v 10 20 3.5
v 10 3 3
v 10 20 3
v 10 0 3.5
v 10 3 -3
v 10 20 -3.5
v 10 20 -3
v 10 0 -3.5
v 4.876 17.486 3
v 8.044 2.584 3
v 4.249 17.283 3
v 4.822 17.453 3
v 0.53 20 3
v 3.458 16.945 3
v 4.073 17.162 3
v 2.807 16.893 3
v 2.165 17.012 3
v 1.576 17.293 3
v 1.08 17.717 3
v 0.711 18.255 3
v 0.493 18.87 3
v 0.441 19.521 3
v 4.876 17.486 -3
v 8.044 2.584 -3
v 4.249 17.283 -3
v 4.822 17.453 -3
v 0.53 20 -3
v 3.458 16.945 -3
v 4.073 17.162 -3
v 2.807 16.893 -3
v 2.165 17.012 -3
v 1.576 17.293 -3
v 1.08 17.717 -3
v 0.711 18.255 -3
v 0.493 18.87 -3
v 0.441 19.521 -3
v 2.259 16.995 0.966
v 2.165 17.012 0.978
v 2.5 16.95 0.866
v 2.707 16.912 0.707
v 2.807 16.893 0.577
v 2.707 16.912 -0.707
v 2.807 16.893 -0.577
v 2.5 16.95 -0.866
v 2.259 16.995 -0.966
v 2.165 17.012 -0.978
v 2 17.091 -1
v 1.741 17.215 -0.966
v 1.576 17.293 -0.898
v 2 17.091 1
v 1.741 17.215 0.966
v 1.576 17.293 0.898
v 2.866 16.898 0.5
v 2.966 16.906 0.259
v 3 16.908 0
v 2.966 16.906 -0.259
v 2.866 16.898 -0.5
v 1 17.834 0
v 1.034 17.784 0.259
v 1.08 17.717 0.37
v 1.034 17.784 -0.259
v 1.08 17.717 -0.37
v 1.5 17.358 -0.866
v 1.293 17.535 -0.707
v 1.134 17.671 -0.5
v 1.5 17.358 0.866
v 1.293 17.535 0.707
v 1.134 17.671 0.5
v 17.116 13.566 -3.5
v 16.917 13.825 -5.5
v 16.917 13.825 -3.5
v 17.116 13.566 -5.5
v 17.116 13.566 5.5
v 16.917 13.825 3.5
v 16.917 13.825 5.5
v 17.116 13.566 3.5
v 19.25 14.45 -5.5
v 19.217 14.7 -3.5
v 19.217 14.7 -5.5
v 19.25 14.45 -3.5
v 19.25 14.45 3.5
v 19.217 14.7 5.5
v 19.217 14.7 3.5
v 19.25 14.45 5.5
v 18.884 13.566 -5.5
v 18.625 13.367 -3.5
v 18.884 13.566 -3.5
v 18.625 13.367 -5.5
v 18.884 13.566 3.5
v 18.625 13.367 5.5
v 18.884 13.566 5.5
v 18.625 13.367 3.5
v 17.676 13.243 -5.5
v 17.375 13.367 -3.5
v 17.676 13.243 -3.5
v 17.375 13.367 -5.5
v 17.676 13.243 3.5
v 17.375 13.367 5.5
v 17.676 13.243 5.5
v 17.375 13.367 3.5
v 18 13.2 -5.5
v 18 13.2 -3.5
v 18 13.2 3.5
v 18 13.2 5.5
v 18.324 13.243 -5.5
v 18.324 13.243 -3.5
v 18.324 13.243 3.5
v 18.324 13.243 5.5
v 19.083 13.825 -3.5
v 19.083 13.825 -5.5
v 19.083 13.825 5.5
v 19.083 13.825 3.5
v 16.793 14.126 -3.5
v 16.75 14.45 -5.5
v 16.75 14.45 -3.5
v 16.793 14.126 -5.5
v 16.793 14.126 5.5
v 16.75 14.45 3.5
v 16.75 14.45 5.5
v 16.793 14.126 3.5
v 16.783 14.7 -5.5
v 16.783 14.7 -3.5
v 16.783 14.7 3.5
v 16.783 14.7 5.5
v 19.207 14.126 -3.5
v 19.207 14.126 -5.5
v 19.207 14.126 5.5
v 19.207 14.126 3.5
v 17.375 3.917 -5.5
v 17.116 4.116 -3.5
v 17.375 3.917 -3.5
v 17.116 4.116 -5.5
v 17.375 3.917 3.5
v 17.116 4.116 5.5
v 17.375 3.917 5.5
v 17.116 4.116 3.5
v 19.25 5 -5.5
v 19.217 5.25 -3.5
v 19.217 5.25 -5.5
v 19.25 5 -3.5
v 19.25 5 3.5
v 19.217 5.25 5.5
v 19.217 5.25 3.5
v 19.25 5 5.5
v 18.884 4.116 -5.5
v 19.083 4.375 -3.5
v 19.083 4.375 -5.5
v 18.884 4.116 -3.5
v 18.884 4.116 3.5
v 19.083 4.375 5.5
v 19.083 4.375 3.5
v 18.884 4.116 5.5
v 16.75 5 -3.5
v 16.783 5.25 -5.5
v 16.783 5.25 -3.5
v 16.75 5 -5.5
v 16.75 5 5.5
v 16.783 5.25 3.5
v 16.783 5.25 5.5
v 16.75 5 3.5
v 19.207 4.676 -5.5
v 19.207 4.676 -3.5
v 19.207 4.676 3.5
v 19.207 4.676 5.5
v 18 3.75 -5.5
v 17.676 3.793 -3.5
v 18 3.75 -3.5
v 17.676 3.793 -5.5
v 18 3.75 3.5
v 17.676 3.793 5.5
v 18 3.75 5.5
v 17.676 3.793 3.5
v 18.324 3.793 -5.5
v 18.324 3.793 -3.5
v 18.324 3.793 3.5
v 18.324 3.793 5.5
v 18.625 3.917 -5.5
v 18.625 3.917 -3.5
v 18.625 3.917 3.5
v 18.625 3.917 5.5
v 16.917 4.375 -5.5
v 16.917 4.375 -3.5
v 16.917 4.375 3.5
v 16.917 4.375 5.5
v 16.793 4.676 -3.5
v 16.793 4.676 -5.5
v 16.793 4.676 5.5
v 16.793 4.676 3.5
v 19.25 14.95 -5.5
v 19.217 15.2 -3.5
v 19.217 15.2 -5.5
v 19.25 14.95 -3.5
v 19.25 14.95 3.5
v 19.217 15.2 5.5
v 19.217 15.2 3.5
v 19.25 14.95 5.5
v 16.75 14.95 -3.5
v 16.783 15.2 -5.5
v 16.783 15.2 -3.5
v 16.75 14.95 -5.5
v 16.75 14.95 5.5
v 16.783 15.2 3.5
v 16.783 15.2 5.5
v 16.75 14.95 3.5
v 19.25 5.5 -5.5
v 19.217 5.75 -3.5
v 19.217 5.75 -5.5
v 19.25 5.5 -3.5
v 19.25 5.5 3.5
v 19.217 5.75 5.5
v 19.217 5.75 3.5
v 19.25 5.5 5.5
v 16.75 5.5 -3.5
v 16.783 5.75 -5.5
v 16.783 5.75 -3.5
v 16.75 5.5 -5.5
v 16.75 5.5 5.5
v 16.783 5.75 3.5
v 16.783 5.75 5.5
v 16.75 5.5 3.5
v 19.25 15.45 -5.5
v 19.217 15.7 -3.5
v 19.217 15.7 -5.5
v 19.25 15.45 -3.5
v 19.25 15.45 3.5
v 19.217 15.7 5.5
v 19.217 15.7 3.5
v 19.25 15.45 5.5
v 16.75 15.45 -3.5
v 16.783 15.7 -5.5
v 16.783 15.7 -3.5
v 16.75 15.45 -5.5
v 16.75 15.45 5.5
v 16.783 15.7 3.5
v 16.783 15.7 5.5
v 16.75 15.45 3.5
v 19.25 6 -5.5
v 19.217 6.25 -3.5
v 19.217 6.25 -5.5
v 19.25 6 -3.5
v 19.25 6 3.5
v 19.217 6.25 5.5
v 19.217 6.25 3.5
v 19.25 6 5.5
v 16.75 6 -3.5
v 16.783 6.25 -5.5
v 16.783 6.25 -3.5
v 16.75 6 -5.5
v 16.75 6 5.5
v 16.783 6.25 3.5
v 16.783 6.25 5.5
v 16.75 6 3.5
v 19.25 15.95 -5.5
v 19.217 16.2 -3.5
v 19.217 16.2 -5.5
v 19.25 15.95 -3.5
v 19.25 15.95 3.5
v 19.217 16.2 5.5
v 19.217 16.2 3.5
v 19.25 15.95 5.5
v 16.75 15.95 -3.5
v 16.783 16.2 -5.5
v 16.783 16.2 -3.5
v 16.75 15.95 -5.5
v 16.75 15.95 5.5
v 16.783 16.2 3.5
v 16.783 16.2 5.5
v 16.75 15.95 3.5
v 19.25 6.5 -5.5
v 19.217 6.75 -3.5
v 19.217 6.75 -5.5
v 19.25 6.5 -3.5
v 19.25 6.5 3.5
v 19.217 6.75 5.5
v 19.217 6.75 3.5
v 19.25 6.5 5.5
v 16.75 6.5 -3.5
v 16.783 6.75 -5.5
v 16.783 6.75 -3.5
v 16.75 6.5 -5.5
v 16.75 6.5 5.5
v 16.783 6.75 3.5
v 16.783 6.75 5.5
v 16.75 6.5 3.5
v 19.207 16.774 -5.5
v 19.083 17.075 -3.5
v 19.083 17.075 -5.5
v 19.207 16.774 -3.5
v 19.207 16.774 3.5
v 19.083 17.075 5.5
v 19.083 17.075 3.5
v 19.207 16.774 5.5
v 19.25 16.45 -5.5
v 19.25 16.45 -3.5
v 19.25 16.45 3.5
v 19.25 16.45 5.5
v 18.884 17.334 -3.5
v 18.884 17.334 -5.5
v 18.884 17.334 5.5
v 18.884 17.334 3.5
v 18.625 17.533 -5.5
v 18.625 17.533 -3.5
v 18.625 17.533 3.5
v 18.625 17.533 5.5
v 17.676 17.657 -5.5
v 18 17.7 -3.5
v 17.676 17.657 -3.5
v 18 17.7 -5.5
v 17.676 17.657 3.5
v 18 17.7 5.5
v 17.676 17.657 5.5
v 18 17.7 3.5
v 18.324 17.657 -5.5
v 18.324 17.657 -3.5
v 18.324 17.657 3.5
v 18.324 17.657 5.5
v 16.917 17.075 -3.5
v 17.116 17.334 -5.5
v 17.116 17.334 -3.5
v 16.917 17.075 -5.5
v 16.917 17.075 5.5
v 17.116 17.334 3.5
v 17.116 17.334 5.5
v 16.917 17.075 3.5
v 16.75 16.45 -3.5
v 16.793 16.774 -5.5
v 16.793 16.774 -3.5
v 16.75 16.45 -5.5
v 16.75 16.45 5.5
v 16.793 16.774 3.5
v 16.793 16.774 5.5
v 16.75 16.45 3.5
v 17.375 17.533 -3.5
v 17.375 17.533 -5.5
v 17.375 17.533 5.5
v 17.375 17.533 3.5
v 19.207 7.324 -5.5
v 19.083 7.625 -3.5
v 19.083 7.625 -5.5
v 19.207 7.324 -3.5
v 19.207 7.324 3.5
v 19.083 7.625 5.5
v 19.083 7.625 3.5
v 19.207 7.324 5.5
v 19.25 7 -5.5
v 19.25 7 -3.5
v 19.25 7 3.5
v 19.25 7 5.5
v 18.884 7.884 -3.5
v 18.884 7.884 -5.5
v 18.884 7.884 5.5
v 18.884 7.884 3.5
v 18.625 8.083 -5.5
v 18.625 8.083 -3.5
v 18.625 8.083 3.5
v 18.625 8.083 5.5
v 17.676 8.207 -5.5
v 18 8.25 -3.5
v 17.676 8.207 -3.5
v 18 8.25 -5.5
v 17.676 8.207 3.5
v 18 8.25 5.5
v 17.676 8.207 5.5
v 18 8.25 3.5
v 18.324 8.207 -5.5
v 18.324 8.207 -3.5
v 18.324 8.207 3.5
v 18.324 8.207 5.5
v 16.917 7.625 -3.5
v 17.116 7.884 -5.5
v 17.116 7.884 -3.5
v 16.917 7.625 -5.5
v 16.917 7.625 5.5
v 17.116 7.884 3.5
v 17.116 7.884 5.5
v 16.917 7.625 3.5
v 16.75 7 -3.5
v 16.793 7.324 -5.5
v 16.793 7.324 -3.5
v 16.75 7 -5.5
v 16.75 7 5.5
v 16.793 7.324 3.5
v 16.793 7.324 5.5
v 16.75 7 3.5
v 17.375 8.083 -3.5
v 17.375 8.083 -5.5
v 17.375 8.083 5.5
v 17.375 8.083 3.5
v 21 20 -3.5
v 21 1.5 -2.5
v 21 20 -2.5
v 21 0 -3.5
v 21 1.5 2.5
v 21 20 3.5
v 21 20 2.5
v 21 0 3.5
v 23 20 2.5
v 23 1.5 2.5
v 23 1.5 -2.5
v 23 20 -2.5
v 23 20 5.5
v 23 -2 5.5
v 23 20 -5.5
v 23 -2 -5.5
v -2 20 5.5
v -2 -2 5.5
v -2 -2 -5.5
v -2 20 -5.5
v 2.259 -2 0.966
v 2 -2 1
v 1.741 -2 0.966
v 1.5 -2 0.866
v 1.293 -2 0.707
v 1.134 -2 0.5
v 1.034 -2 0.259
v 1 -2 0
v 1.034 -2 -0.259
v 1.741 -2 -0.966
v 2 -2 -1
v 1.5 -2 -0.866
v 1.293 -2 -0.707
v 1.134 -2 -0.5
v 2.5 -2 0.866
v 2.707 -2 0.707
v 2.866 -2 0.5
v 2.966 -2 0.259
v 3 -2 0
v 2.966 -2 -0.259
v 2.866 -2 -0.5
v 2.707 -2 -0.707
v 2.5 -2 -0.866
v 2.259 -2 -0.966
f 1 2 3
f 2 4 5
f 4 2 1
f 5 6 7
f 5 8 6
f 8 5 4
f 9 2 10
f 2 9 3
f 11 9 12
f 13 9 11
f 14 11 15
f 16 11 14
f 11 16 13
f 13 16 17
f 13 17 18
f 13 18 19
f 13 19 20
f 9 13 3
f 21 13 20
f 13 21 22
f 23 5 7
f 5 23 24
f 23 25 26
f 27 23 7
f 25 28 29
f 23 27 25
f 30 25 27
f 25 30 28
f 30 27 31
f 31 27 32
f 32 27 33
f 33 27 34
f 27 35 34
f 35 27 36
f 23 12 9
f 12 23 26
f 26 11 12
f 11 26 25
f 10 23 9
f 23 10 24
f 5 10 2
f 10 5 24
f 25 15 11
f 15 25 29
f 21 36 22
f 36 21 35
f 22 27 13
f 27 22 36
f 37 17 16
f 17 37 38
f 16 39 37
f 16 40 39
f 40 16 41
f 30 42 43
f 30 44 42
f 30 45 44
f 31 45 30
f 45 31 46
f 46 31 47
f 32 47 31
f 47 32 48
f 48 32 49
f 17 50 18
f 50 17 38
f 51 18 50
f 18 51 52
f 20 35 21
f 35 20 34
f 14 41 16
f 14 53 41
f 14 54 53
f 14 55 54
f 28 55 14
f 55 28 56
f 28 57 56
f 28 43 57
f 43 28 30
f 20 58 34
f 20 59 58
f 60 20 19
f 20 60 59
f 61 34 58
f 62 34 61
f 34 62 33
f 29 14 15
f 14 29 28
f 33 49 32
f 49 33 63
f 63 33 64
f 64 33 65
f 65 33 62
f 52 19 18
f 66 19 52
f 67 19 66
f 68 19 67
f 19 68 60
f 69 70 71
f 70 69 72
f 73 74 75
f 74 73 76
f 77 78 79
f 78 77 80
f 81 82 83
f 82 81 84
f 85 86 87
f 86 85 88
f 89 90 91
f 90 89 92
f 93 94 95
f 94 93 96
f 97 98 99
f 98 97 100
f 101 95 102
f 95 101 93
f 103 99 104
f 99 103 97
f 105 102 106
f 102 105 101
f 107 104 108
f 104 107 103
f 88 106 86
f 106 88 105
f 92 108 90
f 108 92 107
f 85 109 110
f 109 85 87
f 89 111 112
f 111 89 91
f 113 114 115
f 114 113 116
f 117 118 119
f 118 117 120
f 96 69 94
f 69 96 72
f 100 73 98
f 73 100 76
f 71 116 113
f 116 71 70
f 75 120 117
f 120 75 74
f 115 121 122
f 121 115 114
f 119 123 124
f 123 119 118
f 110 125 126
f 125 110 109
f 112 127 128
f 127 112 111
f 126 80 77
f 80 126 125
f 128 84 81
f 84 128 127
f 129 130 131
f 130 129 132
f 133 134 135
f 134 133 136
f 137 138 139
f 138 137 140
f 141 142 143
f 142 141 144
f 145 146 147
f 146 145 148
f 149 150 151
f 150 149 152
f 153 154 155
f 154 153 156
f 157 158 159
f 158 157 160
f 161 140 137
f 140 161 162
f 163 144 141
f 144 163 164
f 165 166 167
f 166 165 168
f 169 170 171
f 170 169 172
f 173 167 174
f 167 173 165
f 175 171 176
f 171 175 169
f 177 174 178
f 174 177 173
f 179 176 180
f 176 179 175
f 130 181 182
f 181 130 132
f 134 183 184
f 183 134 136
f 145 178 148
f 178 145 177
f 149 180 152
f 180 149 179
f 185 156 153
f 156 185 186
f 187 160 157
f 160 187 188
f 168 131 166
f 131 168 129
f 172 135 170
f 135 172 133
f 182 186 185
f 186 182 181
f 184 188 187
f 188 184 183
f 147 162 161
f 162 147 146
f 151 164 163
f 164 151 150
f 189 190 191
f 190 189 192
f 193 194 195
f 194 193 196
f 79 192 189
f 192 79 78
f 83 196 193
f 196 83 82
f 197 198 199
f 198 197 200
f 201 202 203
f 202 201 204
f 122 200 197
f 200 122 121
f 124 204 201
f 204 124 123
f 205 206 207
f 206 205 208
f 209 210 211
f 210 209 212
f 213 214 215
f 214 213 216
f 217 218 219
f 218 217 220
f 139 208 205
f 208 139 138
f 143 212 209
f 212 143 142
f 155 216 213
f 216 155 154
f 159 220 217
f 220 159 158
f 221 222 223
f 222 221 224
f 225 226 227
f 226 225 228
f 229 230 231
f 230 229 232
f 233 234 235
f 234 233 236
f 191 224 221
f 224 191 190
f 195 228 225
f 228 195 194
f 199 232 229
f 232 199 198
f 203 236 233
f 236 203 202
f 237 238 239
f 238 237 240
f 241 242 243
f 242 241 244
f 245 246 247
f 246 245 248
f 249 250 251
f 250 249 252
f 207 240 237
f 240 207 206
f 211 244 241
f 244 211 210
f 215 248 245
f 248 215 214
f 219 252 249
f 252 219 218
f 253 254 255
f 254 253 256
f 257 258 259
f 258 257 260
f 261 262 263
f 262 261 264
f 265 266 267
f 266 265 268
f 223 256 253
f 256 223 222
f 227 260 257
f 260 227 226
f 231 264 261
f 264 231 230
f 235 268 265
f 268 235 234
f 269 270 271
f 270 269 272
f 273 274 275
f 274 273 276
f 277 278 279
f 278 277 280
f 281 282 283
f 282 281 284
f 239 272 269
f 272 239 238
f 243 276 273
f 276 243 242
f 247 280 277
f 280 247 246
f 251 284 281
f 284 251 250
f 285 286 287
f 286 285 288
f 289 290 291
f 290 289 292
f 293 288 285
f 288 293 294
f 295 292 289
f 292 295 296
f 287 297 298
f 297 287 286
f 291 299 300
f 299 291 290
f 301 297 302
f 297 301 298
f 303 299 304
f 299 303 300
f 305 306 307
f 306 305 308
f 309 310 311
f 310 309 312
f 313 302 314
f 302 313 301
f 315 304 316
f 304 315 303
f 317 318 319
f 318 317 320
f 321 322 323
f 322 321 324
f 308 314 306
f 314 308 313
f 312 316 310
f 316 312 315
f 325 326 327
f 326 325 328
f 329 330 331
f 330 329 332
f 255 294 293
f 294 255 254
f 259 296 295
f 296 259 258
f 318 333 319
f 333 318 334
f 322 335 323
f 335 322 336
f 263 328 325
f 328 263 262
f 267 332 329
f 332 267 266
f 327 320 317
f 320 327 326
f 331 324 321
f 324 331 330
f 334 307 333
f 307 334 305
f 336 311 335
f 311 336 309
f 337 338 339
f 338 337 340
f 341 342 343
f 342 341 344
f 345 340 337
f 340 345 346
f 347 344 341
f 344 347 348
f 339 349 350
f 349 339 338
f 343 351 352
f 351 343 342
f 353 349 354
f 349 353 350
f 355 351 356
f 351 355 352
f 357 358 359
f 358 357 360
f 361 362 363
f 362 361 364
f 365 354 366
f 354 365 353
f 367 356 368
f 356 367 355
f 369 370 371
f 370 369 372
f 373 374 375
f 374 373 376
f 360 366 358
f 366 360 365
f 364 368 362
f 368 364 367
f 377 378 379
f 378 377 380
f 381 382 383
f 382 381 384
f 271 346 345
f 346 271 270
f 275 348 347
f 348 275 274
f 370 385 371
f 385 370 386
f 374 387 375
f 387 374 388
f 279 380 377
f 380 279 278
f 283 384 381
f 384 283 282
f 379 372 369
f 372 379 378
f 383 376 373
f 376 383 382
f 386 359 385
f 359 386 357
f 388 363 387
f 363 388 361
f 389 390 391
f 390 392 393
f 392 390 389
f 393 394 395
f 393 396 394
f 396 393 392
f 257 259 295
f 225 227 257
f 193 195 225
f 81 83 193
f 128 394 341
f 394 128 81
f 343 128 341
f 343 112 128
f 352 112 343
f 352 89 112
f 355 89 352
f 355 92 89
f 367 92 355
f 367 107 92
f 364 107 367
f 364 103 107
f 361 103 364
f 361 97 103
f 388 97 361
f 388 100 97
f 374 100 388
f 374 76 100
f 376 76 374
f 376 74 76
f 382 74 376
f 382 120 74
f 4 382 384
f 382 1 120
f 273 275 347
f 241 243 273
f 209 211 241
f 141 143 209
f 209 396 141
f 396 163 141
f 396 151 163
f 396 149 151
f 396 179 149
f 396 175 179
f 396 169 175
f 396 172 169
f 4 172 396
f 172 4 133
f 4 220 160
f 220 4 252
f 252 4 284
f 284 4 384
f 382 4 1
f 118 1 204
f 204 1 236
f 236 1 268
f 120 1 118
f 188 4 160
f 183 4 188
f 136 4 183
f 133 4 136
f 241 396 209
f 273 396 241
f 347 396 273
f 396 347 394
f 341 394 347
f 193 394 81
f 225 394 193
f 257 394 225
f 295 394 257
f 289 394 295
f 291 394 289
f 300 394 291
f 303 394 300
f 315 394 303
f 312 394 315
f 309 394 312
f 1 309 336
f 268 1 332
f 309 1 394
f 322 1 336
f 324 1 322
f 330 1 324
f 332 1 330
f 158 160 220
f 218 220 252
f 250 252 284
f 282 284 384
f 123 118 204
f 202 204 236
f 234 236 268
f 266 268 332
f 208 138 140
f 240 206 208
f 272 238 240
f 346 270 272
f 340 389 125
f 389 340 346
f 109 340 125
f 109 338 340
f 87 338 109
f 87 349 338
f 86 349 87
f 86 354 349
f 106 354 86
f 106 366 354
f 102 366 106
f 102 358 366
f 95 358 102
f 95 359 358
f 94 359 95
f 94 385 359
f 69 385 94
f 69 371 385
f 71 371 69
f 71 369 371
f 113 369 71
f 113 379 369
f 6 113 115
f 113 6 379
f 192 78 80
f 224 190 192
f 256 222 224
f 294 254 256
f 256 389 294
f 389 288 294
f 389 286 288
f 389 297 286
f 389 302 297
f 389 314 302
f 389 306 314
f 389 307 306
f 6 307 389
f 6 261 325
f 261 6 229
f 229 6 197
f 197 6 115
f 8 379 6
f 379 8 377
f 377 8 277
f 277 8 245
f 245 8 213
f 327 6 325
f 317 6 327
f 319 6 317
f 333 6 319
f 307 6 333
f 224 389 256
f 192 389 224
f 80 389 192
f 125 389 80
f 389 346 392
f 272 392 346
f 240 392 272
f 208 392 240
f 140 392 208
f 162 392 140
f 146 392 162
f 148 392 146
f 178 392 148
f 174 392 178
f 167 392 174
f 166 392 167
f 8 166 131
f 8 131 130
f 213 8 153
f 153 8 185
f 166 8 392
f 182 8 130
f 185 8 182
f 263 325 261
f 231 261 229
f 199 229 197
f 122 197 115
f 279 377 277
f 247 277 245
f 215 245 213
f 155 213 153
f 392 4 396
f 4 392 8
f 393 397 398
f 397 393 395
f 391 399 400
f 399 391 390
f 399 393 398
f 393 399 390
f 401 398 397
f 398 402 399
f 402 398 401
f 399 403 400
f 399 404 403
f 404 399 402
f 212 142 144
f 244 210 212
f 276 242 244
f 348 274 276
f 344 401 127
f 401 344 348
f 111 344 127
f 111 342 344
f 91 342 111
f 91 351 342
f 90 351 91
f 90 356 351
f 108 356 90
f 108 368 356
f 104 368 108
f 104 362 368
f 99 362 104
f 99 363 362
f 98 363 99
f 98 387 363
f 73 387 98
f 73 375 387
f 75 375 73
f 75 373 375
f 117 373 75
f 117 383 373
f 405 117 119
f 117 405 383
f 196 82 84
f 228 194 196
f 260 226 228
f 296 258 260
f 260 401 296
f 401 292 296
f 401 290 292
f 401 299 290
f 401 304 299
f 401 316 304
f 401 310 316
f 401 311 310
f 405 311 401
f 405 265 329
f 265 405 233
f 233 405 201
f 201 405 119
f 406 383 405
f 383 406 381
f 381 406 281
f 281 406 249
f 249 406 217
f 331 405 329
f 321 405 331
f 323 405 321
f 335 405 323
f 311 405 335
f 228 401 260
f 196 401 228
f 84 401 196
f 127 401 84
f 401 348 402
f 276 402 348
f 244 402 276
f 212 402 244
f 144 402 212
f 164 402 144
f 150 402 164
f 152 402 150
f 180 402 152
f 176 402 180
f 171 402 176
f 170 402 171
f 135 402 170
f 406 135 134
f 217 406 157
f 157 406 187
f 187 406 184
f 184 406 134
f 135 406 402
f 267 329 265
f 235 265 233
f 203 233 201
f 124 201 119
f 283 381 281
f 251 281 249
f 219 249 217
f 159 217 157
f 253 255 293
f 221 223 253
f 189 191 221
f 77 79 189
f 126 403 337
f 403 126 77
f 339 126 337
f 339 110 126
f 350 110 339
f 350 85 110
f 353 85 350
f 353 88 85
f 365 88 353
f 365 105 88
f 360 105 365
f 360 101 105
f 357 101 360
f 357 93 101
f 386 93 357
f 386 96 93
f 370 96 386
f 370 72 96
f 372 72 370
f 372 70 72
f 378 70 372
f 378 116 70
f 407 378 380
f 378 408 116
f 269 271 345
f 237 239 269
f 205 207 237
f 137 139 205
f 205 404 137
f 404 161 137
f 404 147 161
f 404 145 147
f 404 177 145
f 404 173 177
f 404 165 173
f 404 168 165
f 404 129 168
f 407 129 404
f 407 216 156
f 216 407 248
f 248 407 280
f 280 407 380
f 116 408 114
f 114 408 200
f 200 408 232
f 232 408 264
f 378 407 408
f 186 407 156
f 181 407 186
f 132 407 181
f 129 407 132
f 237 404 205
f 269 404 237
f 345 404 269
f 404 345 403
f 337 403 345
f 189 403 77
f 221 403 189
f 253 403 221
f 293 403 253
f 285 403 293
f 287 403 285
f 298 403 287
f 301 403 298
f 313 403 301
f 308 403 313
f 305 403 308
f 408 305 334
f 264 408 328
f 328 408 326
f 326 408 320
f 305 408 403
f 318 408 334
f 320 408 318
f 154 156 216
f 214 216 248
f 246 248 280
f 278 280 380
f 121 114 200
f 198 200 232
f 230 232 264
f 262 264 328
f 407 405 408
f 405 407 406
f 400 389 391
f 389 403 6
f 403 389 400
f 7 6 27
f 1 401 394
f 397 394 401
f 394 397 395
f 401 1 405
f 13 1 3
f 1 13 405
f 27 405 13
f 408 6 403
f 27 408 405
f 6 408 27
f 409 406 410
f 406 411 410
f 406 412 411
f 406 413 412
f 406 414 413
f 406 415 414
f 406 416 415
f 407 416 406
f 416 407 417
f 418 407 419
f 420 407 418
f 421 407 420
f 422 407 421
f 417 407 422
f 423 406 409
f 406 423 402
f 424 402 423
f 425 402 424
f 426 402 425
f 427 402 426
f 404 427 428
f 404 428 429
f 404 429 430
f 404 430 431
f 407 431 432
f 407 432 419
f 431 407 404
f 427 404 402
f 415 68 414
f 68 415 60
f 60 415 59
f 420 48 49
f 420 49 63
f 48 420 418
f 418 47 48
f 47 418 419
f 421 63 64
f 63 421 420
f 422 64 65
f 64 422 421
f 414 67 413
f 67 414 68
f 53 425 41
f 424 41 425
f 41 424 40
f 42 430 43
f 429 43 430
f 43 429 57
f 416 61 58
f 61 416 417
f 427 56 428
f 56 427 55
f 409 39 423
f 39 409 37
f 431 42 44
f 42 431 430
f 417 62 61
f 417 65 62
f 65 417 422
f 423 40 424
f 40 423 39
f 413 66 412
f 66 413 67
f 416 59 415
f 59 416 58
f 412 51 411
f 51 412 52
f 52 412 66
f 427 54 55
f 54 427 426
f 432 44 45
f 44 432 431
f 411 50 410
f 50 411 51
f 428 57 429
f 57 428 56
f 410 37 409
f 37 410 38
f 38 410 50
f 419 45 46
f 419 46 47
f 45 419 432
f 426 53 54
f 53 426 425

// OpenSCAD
filament_or = 2.0 / 2;

wall_th = 1;
wire_or = 1;

switch_w = 21;
switch_l = 11;
switch_h = 7;
switch_hole_offset_w = 5;
switch_hole_offset_l = 3;
switch_hole_ir = 2.5 / 2;
switch_hole_c_c = 6.95 + 2 * switch_hole_ir;

// edge of switch to far side of roller, resting
switch_roller_rest_h = 10;

switch_roller_offset = 3;
switch_roller_overhang = 2.3;
switch_roller_h = 6;
switch_roller_w = 20;
switch_roller_l = 6.5;
switch_roller_th = 0.2;
switch_roller_or = 5/2;
switch_roller_clearance = 6;

switch_pin_clearance = 1.5;
switch_pin_h = 5;

module roller(rotation=0) {
    rotate([0, 0, rotation]) {
        translate([-2, 0, -switch_roller_h/2])
            cube([2, switch_roller_w,
     switch_roller_h]);
        translate([-switch_roller_clearance + switch_roller_or, switch_roller_w-switch_roller_or, -switch_roller_h/2])
            cylinder(r=switch_roller_or, h=switch_roller_h);
    }
}
switch_max_angle = 12;
module switch() {
    translate([switch_roller_rest_h, 0, -switch_h/2])
        cube([switch_l, switch_w, switch_h]);      
    
    translate([switch_roller_rest_h, switch_roller_offset, 0]) {     for (i=[0:switch_max_angle/4:switch_max_angle])
            roller(i);
        % roller(switch_max_angle);
    }
    translate([switch_roller_rest_h + switch_l, switch_pin_clearance, -switch_pin_h/2])
        cube([switch_pin_h, switch_w - 1 * switch_pin_clearance, switch_pin_h]);
    
    for (dx=[0:0.5:2]) {
        translate([
            switch_roller_rest_h + switch_l - switch_hole_offset_l, 
            dx + switch_hole_offset_w + switch_hole_c_c, -switch_h*1.5])
            cylinder(r=switch_hole_ir, h=4 * switch_h);
        translate([
            switch_roller_rest_h + switch_l - switch_hole_offset_l, 
            dx + switch_hole_offset_w, -switch_h*1.5])
            cylinder(r=switch_hole_ir, h=4 * switch_h);
    }
}

holder_l = 25;
holder_w = 22;
holder_h = 11;

module filament(length=2 * holder_w) {
    rotate([0, 90, 0])
    cylinder(r=filament_or, h=length, center=true);
}

module filament_path() {
    translate([2*filament_or, 0, 0])
    rotate([0, 0, 90])
        filament();
}

module filament_alarm() {
    difference() {
        # translate([-2, -2, -holder_h/2])
            cube([holder_l, holder_w, holder_h], center=false);
        switch();
        
        filament_path();
    }
    % filament_path();
}

$fn = 24;
filament_alarm();
